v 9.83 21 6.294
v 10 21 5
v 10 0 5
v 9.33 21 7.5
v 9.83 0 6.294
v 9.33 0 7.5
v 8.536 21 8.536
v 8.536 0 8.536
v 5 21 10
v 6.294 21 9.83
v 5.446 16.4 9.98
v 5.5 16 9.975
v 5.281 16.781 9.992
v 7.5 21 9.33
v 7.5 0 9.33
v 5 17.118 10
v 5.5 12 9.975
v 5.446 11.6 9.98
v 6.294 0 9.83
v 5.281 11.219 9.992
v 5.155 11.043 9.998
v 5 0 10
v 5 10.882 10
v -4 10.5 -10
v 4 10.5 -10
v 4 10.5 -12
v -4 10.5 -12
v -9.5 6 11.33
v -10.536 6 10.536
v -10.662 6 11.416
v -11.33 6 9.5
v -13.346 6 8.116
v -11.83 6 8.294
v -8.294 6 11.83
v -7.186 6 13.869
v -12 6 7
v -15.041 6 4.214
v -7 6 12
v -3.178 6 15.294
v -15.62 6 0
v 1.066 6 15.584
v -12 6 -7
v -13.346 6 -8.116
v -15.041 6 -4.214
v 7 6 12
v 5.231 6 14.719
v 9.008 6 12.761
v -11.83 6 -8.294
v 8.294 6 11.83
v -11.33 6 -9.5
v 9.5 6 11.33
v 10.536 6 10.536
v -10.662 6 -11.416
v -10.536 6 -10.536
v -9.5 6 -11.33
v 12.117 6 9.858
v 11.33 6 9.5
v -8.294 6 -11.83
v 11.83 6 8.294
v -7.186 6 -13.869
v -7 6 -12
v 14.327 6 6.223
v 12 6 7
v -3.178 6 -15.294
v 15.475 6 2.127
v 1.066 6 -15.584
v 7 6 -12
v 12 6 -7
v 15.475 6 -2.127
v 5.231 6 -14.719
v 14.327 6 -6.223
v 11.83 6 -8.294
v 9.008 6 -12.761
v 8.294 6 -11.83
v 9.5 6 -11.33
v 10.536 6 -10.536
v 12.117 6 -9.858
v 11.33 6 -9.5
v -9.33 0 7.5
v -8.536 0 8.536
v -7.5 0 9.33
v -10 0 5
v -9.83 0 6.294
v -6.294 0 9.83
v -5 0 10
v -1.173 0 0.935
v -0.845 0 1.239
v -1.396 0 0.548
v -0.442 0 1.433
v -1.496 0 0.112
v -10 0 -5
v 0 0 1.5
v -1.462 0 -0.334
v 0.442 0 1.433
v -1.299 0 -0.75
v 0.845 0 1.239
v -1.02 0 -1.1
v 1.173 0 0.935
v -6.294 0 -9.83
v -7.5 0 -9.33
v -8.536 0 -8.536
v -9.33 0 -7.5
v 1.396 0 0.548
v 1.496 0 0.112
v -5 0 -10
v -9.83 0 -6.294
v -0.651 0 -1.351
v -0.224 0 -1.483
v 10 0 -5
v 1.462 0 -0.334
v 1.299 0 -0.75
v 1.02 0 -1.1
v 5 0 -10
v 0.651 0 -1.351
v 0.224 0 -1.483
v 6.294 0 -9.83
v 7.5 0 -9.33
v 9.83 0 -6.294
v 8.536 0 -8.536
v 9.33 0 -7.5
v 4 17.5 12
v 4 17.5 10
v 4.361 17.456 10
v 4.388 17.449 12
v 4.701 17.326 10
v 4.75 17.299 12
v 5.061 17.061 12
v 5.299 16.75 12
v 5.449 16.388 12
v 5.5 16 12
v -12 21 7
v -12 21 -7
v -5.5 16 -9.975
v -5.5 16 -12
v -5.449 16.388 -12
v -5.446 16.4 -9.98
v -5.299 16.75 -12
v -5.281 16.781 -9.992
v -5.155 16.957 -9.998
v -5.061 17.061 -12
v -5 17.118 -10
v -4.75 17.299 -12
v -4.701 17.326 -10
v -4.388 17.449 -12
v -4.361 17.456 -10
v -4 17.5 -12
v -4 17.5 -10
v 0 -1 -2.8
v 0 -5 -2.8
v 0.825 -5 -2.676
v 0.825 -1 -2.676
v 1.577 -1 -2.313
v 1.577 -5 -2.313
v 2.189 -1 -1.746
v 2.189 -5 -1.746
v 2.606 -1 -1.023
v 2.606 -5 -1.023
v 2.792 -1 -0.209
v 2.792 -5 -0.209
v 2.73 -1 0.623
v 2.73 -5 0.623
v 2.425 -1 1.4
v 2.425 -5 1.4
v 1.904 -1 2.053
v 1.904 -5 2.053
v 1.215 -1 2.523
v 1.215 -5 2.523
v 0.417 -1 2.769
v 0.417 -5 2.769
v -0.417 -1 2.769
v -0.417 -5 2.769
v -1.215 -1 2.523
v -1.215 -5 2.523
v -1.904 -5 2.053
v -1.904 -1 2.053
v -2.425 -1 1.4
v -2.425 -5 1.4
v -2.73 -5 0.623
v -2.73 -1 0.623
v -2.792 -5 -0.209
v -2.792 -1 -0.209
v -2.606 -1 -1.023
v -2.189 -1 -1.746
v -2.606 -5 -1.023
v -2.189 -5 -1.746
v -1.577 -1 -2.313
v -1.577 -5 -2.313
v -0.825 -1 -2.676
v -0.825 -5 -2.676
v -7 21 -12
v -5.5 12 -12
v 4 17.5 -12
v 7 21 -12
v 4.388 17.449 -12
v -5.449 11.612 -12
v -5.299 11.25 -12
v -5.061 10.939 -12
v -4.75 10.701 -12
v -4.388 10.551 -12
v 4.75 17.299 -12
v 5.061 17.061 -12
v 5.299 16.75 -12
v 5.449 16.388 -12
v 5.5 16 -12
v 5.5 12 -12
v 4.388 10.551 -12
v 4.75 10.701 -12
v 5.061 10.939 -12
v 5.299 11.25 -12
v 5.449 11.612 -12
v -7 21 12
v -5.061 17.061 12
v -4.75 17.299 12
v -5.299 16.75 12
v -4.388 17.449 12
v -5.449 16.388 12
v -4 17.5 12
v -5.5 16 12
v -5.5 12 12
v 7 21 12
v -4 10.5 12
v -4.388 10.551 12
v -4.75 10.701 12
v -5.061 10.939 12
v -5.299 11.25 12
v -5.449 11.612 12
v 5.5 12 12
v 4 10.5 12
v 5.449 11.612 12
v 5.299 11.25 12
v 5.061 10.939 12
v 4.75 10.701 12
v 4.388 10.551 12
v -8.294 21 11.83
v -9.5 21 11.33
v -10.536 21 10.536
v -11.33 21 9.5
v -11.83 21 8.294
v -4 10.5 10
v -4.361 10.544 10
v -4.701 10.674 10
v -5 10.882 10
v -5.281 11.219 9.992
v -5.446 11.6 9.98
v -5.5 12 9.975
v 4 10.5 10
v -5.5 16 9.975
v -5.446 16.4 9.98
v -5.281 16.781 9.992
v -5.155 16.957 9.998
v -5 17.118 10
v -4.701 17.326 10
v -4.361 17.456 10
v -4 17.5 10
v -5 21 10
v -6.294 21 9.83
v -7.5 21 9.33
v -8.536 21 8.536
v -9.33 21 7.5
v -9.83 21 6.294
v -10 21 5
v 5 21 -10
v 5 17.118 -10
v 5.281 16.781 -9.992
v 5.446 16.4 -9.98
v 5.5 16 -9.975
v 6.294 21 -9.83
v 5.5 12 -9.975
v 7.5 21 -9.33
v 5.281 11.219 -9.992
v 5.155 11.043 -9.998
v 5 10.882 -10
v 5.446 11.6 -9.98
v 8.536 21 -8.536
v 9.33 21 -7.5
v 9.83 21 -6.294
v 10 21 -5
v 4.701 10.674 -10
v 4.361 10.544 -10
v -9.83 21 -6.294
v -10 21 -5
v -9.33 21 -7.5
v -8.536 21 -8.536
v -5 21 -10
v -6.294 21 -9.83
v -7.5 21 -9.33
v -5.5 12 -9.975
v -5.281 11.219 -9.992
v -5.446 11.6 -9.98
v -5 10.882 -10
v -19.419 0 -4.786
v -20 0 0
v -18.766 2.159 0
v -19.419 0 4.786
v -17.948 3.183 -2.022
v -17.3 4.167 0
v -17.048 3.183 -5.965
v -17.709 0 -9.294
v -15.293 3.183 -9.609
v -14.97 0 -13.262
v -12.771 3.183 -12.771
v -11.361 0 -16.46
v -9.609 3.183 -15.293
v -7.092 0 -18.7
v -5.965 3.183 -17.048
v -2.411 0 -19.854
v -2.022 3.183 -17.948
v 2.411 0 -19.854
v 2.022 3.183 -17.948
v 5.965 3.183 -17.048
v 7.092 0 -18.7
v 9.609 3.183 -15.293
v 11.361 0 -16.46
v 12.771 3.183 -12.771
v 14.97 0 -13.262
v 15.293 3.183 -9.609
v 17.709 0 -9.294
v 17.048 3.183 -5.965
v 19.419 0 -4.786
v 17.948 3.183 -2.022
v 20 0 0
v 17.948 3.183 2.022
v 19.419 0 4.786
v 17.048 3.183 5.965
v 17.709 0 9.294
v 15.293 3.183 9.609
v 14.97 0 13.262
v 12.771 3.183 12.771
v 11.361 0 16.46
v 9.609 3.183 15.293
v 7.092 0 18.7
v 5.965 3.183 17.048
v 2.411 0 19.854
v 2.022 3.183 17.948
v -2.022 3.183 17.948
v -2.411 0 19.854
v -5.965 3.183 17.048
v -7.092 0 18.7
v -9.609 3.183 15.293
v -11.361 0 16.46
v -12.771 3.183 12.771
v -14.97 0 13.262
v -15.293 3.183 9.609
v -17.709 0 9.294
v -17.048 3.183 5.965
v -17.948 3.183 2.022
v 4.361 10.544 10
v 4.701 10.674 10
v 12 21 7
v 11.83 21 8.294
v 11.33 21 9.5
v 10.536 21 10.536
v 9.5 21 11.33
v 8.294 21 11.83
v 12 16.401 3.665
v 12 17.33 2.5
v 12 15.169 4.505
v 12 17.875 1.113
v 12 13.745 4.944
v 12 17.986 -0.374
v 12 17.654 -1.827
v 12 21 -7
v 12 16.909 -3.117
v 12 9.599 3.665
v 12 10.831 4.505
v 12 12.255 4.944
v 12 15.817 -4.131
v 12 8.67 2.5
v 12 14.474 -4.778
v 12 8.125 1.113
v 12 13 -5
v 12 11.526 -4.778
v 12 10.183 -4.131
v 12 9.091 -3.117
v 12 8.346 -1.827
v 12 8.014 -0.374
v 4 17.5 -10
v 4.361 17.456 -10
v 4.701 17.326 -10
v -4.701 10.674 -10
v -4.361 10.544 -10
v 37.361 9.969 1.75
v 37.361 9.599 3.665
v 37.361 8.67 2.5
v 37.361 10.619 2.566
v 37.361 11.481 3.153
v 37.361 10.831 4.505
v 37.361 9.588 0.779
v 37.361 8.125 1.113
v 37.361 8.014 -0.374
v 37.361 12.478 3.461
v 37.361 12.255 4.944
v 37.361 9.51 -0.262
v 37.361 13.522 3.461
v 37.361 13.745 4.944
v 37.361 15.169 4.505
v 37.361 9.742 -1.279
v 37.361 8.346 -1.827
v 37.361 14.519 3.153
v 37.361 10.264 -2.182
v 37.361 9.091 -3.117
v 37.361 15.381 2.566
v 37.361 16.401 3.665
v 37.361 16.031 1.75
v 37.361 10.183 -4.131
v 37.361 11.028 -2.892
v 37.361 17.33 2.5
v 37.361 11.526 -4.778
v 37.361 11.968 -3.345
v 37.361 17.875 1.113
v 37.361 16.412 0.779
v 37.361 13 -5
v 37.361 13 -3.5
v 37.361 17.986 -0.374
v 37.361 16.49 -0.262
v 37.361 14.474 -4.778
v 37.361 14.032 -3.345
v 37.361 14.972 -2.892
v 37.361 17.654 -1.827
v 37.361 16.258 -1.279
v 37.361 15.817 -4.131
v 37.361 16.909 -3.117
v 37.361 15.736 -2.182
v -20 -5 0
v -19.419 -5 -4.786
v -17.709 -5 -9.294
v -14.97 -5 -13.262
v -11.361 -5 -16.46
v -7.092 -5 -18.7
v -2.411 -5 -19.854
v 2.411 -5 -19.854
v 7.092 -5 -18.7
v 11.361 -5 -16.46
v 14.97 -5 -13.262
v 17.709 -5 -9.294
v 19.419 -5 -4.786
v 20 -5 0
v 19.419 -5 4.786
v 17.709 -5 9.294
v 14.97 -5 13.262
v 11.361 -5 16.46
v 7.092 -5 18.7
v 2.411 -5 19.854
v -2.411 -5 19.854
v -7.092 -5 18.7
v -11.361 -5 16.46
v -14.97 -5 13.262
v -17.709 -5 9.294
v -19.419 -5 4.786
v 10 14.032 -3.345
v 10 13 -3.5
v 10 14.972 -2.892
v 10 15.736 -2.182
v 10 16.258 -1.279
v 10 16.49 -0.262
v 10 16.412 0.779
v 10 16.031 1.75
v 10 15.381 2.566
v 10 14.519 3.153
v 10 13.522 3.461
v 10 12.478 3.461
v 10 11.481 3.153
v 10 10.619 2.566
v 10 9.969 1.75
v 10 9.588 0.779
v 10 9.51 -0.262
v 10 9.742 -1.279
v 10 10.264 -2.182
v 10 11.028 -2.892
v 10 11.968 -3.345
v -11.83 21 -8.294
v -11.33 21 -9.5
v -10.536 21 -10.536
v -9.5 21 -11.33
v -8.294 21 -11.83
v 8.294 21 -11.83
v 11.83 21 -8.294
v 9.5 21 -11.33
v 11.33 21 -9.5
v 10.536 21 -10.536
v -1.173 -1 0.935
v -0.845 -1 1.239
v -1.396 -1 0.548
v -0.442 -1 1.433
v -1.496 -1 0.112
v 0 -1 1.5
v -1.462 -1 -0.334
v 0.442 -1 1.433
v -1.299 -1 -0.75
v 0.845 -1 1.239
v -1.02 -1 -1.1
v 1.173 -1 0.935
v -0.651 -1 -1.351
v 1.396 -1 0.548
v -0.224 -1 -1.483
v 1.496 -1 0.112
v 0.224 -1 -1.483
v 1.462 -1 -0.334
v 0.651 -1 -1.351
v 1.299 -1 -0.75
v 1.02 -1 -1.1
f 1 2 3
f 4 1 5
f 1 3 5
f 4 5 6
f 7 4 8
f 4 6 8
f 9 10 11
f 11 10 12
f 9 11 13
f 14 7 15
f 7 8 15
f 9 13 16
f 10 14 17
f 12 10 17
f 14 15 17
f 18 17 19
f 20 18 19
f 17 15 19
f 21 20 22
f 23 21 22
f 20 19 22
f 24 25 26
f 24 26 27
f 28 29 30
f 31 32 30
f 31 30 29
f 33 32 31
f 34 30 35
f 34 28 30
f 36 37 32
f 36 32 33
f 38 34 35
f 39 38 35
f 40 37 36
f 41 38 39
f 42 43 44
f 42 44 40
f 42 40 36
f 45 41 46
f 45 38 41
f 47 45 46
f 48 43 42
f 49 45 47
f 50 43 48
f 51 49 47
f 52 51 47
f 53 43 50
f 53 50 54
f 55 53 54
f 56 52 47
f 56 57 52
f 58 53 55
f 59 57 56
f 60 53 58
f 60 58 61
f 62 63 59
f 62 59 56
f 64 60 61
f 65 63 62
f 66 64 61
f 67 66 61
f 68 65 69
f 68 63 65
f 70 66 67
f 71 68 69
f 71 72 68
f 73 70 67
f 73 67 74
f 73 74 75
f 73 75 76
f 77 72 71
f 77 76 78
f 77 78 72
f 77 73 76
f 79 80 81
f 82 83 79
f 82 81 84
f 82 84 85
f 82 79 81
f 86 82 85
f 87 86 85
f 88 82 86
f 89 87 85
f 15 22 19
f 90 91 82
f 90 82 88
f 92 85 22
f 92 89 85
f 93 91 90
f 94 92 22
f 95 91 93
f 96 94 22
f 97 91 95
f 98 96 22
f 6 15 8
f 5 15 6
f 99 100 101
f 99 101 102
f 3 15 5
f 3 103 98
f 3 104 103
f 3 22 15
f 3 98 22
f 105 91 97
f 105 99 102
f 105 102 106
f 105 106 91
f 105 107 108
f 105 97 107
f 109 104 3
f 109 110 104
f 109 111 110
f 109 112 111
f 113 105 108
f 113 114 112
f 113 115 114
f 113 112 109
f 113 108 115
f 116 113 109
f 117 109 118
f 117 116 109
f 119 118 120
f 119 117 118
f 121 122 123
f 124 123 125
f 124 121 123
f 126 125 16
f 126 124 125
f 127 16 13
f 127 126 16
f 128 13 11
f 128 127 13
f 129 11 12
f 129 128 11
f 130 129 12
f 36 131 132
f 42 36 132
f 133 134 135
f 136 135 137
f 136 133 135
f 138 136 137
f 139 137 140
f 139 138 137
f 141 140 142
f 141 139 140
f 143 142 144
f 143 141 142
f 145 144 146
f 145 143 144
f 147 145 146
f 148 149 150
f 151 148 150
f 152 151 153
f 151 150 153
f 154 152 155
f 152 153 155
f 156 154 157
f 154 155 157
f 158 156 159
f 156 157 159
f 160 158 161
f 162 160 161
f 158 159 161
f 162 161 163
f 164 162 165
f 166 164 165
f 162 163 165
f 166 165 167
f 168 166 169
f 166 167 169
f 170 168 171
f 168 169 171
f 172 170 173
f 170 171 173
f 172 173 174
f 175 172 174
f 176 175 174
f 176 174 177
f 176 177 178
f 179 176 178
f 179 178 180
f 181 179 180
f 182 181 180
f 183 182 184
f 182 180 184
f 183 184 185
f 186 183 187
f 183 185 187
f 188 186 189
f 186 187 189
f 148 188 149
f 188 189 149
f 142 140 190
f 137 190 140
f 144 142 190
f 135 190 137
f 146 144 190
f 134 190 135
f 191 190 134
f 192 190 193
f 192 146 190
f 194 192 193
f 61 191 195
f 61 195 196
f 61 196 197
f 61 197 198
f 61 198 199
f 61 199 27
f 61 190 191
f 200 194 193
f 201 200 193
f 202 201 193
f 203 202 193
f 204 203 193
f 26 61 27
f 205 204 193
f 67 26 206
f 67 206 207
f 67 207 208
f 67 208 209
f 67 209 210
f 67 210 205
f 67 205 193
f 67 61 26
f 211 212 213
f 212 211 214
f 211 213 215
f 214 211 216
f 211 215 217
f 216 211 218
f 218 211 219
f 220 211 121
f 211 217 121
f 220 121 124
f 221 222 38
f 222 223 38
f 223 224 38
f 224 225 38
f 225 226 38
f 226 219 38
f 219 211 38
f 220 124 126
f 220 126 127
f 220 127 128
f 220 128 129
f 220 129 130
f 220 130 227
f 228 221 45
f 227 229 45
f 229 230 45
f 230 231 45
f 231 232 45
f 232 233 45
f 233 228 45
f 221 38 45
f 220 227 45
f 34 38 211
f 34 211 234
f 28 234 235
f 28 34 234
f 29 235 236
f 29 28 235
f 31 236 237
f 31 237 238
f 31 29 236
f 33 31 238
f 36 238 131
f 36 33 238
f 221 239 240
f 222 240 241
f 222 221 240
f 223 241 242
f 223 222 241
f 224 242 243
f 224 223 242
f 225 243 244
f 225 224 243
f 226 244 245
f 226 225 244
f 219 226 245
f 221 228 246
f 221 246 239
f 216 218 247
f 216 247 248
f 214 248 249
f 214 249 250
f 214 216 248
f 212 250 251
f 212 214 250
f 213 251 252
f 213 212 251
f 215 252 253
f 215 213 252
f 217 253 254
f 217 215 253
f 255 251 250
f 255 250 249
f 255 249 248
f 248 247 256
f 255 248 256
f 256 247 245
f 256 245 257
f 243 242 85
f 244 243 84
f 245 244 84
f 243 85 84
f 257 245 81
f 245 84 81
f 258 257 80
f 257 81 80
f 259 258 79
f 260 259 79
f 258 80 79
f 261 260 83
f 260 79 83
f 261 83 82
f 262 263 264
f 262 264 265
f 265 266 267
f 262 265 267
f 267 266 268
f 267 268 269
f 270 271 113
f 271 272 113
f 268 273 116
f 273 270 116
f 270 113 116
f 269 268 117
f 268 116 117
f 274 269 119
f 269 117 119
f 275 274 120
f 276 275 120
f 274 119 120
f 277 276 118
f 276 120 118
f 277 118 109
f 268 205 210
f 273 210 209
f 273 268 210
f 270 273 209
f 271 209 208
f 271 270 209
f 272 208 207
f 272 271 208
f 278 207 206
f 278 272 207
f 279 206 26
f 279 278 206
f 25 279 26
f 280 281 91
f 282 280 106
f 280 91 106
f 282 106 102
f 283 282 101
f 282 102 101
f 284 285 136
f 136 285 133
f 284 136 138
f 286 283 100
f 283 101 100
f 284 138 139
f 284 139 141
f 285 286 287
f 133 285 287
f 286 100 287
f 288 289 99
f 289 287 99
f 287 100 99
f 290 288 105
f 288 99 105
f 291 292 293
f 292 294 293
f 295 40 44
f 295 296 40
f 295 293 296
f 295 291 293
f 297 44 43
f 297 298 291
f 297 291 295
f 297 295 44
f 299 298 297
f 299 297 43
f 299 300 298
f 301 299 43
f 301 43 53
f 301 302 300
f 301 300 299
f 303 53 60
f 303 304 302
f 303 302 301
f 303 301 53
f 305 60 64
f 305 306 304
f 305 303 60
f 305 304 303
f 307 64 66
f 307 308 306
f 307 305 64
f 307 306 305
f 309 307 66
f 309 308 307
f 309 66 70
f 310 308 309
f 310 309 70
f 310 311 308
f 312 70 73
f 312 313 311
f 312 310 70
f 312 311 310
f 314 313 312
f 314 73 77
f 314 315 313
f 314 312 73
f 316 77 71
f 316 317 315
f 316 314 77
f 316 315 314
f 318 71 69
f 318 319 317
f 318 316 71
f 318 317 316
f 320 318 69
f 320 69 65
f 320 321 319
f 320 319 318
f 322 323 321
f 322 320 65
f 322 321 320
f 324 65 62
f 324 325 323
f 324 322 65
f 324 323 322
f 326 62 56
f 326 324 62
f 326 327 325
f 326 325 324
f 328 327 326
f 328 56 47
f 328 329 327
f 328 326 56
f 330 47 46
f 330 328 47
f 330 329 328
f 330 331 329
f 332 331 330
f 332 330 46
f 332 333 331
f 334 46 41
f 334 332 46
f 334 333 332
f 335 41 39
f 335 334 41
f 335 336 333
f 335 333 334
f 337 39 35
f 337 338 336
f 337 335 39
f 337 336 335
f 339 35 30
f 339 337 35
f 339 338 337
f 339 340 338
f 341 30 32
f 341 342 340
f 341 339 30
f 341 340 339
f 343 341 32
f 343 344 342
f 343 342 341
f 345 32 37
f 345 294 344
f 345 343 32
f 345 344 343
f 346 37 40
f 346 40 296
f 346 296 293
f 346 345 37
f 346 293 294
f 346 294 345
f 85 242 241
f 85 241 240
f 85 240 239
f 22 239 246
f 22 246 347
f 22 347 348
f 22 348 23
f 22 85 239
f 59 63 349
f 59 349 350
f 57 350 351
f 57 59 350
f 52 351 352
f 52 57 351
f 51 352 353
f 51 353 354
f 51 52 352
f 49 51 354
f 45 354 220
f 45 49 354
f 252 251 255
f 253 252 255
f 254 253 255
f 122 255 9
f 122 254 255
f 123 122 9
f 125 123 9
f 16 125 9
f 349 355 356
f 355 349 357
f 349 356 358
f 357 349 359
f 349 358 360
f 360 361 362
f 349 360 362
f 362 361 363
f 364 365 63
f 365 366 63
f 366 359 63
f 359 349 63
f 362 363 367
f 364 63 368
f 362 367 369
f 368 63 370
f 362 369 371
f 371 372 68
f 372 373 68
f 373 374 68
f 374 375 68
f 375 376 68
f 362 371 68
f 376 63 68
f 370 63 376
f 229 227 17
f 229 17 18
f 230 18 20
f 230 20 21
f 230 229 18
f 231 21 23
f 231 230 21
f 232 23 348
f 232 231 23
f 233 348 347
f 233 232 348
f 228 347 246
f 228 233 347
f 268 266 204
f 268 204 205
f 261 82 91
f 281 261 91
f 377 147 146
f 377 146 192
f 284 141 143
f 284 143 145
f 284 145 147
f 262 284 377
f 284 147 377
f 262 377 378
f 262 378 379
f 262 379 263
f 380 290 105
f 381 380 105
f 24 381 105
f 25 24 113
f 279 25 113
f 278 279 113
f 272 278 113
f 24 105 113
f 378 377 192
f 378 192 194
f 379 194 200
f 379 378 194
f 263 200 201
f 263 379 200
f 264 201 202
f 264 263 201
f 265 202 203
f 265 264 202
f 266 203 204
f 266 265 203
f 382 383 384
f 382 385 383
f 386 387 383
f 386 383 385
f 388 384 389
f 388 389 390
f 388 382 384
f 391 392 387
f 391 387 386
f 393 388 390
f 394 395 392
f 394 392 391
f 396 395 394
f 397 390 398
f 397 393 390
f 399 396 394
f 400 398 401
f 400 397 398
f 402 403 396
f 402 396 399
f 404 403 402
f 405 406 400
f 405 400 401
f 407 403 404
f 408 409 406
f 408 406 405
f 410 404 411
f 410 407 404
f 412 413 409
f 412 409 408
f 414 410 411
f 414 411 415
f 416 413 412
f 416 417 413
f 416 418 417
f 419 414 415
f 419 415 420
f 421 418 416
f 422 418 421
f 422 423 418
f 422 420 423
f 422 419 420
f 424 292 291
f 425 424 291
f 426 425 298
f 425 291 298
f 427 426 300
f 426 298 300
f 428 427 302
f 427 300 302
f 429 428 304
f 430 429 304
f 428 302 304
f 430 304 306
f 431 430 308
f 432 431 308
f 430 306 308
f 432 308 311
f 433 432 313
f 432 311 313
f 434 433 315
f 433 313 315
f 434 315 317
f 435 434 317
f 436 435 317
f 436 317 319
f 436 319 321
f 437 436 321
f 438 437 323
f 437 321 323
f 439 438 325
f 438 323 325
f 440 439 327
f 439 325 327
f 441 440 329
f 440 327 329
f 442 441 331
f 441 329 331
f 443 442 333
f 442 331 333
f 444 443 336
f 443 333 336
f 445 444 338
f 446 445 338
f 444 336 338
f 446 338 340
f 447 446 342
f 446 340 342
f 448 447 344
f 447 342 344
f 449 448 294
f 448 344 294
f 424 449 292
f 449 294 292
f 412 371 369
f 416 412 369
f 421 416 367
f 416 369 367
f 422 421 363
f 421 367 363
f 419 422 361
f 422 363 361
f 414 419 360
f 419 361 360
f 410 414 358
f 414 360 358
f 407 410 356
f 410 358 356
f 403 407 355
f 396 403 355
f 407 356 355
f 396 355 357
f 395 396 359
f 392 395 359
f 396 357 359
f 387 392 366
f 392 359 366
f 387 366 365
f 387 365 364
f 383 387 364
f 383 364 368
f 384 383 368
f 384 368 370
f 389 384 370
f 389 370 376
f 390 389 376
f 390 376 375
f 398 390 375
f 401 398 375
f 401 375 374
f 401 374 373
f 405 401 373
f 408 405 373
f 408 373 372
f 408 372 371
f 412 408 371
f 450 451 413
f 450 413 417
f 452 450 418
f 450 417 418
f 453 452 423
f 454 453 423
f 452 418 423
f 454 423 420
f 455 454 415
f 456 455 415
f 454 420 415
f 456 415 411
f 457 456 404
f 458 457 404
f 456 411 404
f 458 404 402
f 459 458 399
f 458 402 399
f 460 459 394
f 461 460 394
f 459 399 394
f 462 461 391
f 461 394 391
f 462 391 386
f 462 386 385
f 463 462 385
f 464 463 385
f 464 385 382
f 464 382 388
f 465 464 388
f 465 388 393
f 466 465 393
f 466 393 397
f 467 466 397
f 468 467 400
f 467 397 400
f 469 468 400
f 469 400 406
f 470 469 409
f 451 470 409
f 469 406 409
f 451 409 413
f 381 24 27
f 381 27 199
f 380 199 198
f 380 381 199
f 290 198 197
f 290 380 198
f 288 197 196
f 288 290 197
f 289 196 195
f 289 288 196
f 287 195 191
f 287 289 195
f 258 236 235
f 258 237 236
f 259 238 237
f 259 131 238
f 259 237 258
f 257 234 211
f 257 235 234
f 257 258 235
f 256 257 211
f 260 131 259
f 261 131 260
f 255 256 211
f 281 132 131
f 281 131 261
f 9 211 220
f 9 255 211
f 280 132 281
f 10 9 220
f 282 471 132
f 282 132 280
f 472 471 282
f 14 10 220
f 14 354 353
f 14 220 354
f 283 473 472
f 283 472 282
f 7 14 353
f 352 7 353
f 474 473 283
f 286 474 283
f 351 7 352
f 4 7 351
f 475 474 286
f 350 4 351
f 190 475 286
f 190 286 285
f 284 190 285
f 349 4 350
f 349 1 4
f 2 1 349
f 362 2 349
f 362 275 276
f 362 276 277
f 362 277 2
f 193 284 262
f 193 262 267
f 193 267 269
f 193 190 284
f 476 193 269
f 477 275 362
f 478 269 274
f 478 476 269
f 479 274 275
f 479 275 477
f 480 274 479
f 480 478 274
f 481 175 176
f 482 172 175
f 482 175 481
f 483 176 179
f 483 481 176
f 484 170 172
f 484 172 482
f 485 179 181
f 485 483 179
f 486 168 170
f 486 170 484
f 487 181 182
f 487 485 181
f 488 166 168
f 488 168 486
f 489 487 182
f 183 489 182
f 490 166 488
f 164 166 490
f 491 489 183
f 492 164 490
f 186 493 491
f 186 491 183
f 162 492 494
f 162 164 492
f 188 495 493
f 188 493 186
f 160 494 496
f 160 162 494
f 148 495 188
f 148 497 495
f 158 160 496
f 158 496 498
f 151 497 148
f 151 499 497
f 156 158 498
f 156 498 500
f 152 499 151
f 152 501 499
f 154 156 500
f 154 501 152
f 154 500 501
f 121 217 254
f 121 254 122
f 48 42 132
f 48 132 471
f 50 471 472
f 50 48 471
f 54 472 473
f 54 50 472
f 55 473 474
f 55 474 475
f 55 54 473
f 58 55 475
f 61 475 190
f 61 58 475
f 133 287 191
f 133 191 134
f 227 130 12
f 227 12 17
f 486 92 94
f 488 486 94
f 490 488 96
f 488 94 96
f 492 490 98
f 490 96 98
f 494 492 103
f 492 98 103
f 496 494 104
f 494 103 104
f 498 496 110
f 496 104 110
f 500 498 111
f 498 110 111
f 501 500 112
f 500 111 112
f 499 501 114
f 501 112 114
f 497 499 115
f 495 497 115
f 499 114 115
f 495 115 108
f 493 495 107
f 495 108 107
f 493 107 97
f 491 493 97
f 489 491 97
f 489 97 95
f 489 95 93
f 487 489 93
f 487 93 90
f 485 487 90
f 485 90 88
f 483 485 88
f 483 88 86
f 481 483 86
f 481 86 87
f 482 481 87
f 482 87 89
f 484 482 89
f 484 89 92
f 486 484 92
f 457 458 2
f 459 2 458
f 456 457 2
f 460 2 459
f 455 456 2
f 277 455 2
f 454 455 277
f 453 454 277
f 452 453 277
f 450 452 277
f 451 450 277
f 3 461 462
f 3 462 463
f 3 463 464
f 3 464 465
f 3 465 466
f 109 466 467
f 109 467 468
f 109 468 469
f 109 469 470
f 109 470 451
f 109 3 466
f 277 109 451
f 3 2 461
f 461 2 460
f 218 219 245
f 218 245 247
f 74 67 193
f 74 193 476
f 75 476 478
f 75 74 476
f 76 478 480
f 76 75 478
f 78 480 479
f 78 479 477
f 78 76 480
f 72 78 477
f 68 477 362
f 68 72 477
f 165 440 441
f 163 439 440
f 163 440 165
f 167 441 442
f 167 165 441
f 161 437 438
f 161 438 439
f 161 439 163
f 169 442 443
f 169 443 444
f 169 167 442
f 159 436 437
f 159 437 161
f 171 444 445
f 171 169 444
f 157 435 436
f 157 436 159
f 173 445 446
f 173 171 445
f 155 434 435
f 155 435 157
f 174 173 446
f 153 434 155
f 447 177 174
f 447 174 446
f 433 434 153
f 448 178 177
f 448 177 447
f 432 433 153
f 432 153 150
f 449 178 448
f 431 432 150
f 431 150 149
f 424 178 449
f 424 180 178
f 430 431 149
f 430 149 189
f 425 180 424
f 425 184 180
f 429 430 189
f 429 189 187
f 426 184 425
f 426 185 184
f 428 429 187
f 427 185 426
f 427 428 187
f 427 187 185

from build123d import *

# Parameters (mm, degrees)
SKETCH_3_R                      = 2.8
CUT_EXTRUDE_2_DEPTH             = 4
SKETCH_8_R                      = 1.5
CUT_EXTRUDE_5_DEPTH             = 4
SKETCH_10_W                     = 24
SKETCH_10_H                     = 24
SKETCH_10_W_2                   = 20
SKETCH_10_H_2                   = 20
EXTRUDE_1_DEPTH                 = 15
EXTRUDE_2_DEPTH                 = 15
EXTRUDE_2_DEPTH_BACK            = 12
SKETCH_7_R                      = 5
SKETCH_7_R_2                    = 3.5
SKETCH_7_5_R                    = 3.5
CUT_EXTRUDE_6_DEPTH             = 12.360679775
FILLET_START                    = 6
FILLET_1_DEPTH                  = 15
FILLET_1_2_DEPTH                = 15
CUT_EXTRUDE_7_REACH             = 55.487
CUT_EXTRUDE_7_DIRECTION_2_DEPTH = 54.486637521
SKETCH_15_R                     = 20
EXTRUDE_3_DEPTH                 = 5
CUT_EXTRUDE_START               = -6
CUT_EXTRUDE_9_DEPTH             = 6
SKETCH_17_R                     = 1.5
CUT_EXTRUDE_10_DEPTH            = 8
SKETCH_18_R                     = 2.8
CUT_EXTRUDE_11_DEPTH            = 4


with BuildPart() as part:
    # 草图1 → 旋转1 (revolve)
    with BuildSketch(Plane.XY):
        with BuildLine():
            ThreePointArc((-15.620499352, 6), (-18.061145964, 3.183133409), (-20, 0))
            Line((-20, 0), (0, 0))
            Line((0, 0), (0, 6))
            Line((0, 6), (-15.620499352, 6))
        make_face()
    revolve(axis=Axis((0, 10, 0), (0, -1, 0)))

    # 草图3 → 切除-拉伸2 (cut)
    with BuildSketch(Plane.XZ):
        with Locations(Location((0, 0, 0), (0, 0, 270))):
            Circle(SKETCH_3_R)
    extrude(amount=-CUT_EXTRUDE_2_DEPTH, mode=Mode.SUBTRACT)

    # 草图8 → 切除-拉伸5 (cut)
    with BuildSketch(Plane.XZ.offset(-4)):
        with Locations(Location((0, 0, 0), (0, 0, 270))):
            Circle(SKETCH_8_R)
    extrude(amount=-CUT_EXTRUDE_5_DEPTH, mode=Mode.SUBTRACT)

    # 草图10 → 拉伸-薄壁1 (add)
    with BuildSketch(Plane(origin=(0, 6, 0), x_dir=(1, 0, 0), z_dir=(0, 1, 0))):
        Rectangle(SKETCH_10_W, SKETCH_10_H)
        Rectangle(SKETCH_10_W_2, SKETCH_10_H_2, mode=Mode.SUBTRACT)
    extrude(amount=EXTRUDE_1_DEPTH)

    # 草图7 → 凸台-拉伸2 (add, two sides: drawn at the far end of the back side and taken through both)
    with BuildSketch(Plane(origin=(22.360679775, 0, 0), x_dir=(0, 0, -1), z_dir=(1, 0, 0)).offset(-EXTRUDE_2_DEPTH_BACK)):
        with Locations((0, 13)):
            Circle(SKETCH_7_R)
        with Locations((0, 13)):
            Circle(SKETCH_7_R_2, mode=Mode.SUBTRACT)
    extrude(amount=EXTRUDE_2_DEPTH + EXTRUDE_2_DEPTH_BACK)

    # 草图7<5> → 切除-拉伸6 (cut)
    with BuildSketch(Plane(origin=(22.360679775, 0, 0), x_dir=(0, 0, -1), z_dir=(1, 0, 0))):
        with Locations((0, 13)):
            Circle(SKETCH_7_5_R)
    extrude(amount=-CUT_EXTRUDE_6_DEPTH, mode=Mode.SUBTRACT)

    # 圆角1: read off the stored shape, not the designer's step
    # 圆角1 outline → 圆角1 (cut)
    with BuildSketch(Plane(origin=(0, 0, 0), x_dir=(1, 0, 0), z_dir=(0, 1, 0)).offset(FILLET_START)):
        with BuildLine():
            ThreePointArc((-12, 7), (-10.535533906, 10.535533906), (-7, 12))
            Line((-7, 12), (-12, 12))
            Line((-12, 12), (-12, 7))
        make_face()
        with BuildLine():
            Line((12, 12), (7, 12))
            ThreePointArc((7, 12), (10.535533906, 10.535533906), (12, 7))
            Line((12, 7), (12, 12))
        make_face()
        with BuildLine():
            ThreePointArc((-7, -12), (-10.535533906, -10.535533906), (-12, -7))
            Line((-12, -7), (-12, -12))
            Line((-12, -12), (-7, -12))
        make_face()
        with BuildLine():
            Line((12, -12), (12, -7))
            ThreePointArc((12, -7), (10.535533906, -10.535533906), (7, -12))
            Line((7, -12), (12, -12))
        make_face()
    extrude(amount=FILLET_1_DEPTH, mode=Mode.SUBTRACT)

    # Fillet 1 2 outline → Fillet 1 2 (add)
    with BuildSketch(Plane(origin=(0, 0, 0), x_dir=(1, 0, 0), z_dir=(0, 1, 0)).offset(FILLET_START)):
        with BuildLine():
            Line((10, -10), (10, -5))
            ThreePointArc((10, -5), (8.535533906, -8.535533906), (5, -10))
            Line((5, -10), (10, -10))
        make_face()
        with BuildLine():
            ThreePointArc((5, 10), (8.535533906, 8.535533906), (10, 5))
            Line((10, 5), (10, 10))
            Line((10, 10), (5, 10))
        make_face()
        with BuildLine():
            Line((-10, -10), (-5, -10))
            ThreePointArc((-5, -10), (-8.535533906, -8.535533906), (-10, -5))
            Line((-10, -5), (-10, -10))
        make_face()
        with BuildLine():
            ThreePointArc((-10, 5), (-8.535533906, 8.535533906), (-5, 10))
            Line((-5, 10), (-10, 10))
            Line((-10, 10), (-10, 5))
        make_face()
    extrude(amount=FILLET_1_2_DEPTH)

    # 切除-拉伸7: up to this face of the body (flat: up to its plane)
    cut_extrude_7_end = Plane(part.part.faces().sort_by_distance((0, 13.5, -12))[0])
    # 草图13 → 切除-拉伸7 (cut, up to the picked face)
    with BuildSketch(Plane.XY.offset(12), mode=Mode.PRIVATE) as cut_extrude_7_sk1:
        with BuildLine():
            Line((-4, 17.5), (4, 17.5))
            ThreePointArc((4, 17.5), (5.060660172, 17.060660172), (5.5, 16))
            Line((5.5, 16), (5.5, 12))
            ThreePointArc((5.5, 12), (5.060660172, 10.939339828), (4, 10.5))
            Line((4, 10.5), (-4, 10.5))
            ThreePointArc((-4, 10.5), (-5.060660172, 10.939339828), (-5.5, 12))
            Line((-5.5, 12), (-5.5, 16))
            ThreePointArc((-5.5, 16), (-5.060660172, 17.060660172), (-4, 17.5))
        make_face()
    cut_extrude_7_tool1 = split(extrude(cut_extrude_7_sk1.sketch, amount=-CUT_EXTRUDE_7_REACH, mode=Mode.PRIVATE), bisect_by=cut_extrude_7_end, keep=Keep.BOTH, mode=Mode.PRIVATE)
    add(cut_extrude_7_tool1.solids().sort_by(Axis((0, 14, 12), (0, 0, -1)))[0], mode=Mode.SUBTRACT)

    # 草图13 → 切除-拉伸7 direction 2 (cut)
    with BuildSketch(Plane.XY.offset(12)):
        with BuildLine():
            Line((-4, 17.5), (4, 17.5))
            ThreePointArc((4, 17.5), (5.060660172, 17.060660172), (5.5, 16))
            Line((5.5, 16), (5.5, 12))
            ThreePointArc((5.5, 12), (5.060660172, 10.939339828), (4, 10.5))
            Line((4, 10.5), (-4, 10.5))
            ThreePointArc((-4, 10.5), (-5.060660172, 10.939339828), (-5.5, 12))
            Line((-5.5, 12), (-5.5, 16))
            ThreePointArc((-5.5, 16), (-5.060660172, 17.060660172), (-4, 17.5))
        make_face()
    extrude(amount=CUT_EXTRUDE_7_DIRECTION_2_DEPTH, mode=Mode.SUBTRACT)

    # 草图15 → 凸台-拉伸3 (add)
    with BuildSketch(Plane.XZ):
        with Locations(Location((0, 0, 0), (0, 0, 180))):
            Circle(SKETCH_15_R)
    extrude(amount=EXTRUDE_3_DEPTH)

    # 草图16 → 切除-拉伸9 (cut)
    with BuildSketch(Plane(origin=(0, 6, 0), x_dir=(1, 0, 0), z_dir=(0, 1, 0)).offset(CUT_EXTRUDE_START)):
        with BuildLine():
            Line((-5, -10), (5, -10))
            ThreePointArc((5, -10), (8.535533906, -8.535533906), (10, -5))
            Line((10, -5), (10, 5))
            ThreePointArc((10, 5), (8.535533906, 8.535533906), (5, 10))
            Line((5, 10), (-5, 10))
            ThreePointArc((-5, 10), (-8.535533906, 8.535533906), (-10, 5))
            Line((-10, 5), (-10, -5))
            ThreePointArc((-10, -5), (-8.535533906, -8.535533906), (-5, -10))
        make_face()
    extrude(amount=CUT_EXTRUDE_9_DEPTH, mode=Mode.SUBTRACT)

    # 草图17 → 切除-拉伸10 (cut)
    with BuildSketch(Plane(origin=(0, 0, 0), x_dir=(1, 0, 0), z_dir=(0, 1, 0))):
        with Locations(Location((0, 0, 0), (0, 0, 270))):
            Circle(SKETCH_17_R)
    extrude(amount=-CUT_EXTRUDE_10_DEPTH, mode=Mode.SUBTRACT)

    # 草图18 → 切除-拉伸11 (cut)
    with BuildSketch(Plane.XZ.offset(5)):
        with Locations(Location((0, 0, 0), (0, 0, 270))):
            Circle(SKETCH_18_R)
    extrude(amount=-CUT_EXTRUDE_11_DEPTH, mode=Mode.SUBTRACT)


solid = part.part
